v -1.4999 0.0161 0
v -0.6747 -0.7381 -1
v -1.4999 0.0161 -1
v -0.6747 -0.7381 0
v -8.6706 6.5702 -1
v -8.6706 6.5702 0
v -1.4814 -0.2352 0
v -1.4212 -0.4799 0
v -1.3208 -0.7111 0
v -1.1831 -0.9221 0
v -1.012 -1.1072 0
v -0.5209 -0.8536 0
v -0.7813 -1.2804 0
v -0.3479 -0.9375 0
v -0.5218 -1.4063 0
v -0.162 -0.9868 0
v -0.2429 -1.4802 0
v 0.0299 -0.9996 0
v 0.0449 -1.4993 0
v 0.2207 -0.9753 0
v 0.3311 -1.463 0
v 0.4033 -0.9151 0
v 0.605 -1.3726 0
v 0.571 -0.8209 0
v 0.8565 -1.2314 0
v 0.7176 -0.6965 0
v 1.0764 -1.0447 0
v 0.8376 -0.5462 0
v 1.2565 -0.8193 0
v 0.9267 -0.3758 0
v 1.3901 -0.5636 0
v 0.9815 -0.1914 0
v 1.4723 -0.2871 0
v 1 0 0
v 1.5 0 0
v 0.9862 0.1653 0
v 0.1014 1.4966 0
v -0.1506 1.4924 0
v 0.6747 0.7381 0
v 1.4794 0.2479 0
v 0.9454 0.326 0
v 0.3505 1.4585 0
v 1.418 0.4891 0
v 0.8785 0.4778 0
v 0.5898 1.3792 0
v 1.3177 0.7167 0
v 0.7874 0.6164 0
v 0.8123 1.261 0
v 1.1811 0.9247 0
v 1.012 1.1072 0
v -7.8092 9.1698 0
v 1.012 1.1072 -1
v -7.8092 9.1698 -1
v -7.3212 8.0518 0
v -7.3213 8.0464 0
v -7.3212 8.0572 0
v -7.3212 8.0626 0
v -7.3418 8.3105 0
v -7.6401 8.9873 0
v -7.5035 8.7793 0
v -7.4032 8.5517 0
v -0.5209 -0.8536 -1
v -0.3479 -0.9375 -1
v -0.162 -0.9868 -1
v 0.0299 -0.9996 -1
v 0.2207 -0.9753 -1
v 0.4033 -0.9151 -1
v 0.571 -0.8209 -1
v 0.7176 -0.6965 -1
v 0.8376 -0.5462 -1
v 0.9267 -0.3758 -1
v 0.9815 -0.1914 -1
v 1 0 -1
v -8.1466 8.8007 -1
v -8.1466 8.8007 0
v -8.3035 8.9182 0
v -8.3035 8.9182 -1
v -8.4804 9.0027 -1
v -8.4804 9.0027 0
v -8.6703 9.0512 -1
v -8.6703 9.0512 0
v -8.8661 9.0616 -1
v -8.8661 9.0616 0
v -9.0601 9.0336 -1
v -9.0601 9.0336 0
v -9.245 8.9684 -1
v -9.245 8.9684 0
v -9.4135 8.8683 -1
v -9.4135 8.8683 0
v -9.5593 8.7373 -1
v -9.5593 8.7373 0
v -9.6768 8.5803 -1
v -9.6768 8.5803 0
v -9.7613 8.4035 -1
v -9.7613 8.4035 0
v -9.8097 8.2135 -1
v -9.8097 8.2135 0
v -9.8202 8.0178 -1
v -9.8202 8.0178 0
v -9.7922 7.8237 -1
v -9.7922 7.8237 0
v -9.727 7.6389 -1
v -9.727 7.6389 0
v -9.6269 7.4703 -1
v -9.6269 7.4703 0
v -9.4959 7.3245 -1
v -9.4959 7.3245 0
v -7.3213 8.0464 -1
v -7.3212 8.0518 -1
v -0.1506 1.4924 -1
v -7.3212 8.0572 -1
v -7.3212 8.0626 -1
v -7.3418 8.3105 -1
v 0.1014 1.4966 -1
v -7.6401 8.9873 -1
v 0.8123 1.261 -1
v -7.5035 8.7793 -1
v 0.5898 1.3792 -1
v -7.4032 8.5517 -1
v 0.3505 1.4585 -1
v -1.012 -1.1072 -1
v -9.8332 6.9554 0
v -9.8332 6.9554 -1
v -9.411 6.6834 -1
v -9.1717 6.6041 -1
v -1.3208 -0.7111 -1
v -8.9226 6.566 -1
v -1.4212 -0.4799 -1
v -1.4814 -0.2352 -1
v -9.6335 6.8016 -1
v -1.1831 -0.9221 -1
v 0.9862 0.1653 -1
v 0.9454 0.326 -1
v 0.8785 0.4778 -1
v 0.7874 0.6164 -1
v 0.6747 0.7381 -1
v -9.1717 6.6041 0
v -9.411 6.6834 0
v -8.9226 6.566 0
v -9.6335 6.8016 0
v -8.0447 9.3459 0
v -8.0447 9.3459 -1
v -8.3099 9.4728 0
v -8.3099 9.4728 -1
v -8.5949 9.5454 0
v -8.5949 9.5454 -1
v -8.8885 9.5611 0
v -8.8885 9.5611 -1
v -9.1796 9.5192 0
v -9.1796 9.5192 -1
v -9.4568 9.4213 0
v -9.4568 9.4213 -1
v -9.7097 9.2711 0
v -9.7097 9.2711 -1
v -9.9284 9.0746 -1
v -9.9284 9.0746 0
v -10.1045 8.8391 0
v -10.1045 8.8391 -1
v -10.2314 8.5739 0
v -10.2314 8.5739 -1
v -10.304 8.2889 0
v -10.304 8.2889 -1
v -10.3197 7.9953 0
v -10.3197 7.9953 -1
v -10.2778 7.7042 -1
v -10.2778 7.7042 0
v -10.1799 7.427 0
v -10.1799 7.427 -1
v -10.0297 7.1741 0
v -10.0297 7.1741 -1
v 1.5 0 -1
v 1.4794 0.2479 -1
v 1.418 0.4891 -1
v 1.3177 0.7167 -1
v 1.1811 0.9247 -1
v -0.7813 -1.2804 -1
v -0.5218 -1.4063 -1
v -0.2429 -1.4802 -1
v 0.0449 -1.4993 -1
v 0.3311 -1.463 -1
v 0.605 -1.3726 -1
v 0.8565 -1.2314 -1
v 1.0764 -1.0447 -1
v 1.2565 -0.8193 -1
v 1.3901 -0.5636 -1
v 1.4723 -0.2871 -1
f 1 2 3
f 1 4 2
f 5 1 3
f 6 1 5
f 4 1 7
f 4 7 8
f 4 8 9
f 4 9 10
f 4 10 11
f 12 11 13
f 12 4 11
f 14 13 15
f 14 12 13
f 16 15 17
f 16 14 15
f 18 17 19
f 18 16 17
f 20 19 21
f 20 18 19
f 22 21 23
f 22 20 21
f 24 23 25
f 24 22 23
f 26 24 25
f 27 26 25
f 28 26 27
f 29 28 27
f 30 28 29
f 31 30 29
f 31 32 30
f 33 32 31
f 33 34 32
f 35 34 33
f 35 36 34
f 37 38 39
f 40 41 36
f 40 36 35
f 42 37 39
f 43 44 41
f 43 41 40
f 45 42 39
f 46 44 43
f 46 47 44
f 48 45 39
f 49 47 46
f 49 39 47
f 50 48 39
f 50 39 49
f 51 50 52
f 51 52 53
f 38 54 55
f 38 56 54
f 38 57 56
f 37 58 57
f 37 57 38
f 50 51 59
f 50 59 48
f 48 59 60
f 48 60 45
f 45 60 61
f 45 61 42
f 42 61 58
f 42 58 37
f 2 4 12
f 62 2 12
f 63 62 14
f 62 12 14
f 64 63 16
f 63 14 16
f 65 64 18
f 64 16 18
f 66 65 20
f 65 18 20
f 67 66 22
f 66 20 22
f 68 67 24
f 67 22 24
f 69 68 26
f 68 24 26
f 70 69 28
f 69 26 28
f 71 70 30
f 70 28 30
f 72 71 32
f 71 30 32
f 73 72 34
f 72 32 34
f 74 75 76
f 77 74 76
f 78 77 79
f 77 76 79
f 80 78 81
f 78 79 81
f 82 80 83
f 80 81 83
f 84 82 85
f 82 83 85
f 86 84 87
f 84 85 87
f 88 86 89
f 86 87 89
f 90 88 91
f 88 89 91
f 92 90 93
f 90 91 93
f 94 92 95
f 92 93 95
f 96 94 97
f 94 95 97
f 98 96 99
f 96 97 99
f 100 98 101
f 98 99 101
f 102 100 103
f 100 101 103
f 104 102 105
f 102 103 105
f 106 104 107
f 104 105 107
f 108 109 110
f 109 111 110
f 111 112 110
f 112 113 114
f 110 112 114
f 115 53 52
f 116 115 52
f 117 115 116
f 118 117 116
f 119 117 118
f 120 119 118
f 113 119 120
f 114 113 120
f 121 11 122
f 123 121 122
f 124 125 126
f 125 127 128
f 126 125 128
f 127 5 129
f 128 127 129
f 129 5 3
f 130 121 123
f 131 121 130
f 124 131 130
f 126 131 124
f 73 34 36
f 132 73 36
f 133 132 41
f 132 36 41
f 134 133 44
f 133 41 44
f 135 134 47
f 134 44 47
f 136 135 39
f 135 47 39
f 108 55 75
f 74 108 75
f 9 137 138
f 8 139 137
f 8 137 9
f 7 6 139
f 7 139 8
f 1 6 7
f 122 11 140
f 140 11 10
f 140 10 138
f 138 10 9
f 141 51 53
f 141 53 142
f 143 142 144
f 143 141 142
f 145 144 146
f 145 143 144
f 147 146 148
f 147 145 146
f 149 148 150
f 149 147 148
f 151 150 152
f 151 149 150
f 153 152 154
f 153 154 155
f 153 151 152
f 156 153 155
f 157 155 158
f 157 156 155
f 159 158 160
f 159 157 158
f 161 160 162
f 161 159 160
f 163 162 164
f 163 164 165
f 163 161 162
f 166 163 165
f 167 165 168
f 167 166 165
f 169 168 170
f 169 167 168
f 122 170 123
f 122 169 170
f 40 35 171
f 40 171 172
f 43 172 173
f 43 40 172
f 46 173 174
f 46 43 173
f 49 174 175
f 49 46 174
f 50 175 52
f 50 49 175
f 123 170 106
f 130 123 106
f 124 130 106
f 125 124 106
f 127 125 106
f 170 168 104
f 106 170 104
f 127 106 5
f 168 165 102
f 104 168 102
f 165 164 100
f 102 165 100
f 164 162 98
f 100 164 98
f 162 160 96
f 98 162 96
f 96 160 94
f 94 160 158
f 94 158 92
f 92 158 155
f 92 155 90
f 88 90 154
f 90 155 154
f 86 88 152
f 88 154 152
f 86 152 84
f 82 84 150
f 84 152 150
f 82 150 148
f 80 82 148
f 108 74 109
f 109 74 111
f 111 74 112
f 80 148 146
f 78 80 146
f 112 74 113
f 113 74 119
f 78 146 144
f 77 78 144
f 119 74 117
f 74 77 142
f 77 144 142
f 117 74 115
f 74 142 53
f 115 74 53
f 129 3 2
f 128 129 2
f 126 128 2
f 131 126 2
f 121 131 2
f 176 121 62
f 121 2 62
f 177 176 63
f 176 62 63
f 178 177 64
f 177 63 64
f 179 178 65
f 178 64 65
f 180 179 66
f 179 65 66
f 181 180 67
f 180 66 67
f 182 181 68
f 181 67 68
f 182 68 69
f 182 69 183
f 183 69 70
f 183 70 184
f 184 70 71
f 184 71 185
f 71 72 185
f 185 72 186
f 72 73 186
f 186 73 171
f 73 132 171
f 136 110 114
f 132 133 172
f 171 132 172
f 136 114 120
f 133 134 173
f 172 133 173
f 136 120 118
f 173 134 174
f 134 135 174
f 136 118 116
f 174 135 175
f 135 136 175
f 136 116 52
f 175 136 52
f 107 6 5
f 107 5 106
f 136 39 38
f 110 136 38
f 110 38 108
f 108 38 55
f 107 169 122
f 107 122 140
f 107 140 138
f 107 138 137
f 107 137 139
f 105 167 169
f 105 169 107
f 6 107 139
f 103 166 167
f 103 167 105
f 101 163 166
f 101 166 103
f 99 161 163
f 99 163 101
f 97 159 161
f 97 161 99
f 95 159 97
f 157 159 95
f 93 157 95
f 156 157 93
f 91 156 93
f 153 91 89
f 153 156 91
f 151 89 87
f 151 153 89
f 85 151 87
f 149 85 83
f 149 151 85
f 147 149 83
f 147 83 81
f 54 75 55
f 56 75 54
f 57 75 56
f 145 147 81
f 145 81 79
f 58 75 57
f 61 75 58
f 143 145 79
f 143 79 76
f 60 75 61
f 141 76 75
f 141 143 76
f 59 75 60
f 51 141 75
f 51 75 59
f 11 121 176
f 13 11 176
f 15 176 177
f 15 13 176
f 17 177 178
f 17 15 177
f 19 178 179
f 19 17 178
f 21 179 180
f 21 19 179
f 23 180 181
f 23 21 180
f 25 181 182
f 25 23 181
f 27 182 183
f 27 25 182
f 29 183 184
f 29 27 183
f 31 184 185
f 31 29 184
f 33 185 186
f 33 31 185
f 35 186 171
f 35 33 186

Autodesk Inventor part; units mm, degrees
ref_plane "YZ Plane" through (0, 0, 0) normal (1, 0, 0) x (0, 1, 0)
ref_plane "XZ Plane" through (0, 0, 0) normal (0, 1, 0) x (-1, 0, 0)
ref_plane "XY Plane" through (0, 0, 0) normal (0, 0, 1) x (1, 0, 0)
sketch "스케치2" plane through (0, 0, 0) normal (0, 0, 1) x (1, 0, 0)
  circle A0 centre (0, 0) radius 1 projected
  circle A1 centre (-8.8212, 8.0626) radius 1 projected
  line L0 (-0.6747, -0.7381) -> (-9.4959, 7.3245)
  line L1 (0.6747, 0.7381) -> (-8.1466, 8.8007)
  line L2 (-1.012, -1.1072) -> (-9.8332, 6.9554)
  line L3 (1.012, 1.1072) -> (-7.8092, 9.1698)
  circle A2 centre (0, 0) radius 1.5
  circle A3 centre (-8.8212, 8.0626) radius 1.5
  dimension "d0" = 0.5
  dimension "d1" = 0.5
  dimension "d2" = 0.5
  dimension "d3" = 0.5
extrude "돌출1" add sketch "스케치2" against normal blind 1 contours A0 L1 A2 L0 | L1 A3 L3 A2 | A2 L2 A3 L0 | L1 A1 L0 A3 picked at (0.2294, 1.2405) picked at (-9.0506, 6.8221)
properties part number "슬롯"
